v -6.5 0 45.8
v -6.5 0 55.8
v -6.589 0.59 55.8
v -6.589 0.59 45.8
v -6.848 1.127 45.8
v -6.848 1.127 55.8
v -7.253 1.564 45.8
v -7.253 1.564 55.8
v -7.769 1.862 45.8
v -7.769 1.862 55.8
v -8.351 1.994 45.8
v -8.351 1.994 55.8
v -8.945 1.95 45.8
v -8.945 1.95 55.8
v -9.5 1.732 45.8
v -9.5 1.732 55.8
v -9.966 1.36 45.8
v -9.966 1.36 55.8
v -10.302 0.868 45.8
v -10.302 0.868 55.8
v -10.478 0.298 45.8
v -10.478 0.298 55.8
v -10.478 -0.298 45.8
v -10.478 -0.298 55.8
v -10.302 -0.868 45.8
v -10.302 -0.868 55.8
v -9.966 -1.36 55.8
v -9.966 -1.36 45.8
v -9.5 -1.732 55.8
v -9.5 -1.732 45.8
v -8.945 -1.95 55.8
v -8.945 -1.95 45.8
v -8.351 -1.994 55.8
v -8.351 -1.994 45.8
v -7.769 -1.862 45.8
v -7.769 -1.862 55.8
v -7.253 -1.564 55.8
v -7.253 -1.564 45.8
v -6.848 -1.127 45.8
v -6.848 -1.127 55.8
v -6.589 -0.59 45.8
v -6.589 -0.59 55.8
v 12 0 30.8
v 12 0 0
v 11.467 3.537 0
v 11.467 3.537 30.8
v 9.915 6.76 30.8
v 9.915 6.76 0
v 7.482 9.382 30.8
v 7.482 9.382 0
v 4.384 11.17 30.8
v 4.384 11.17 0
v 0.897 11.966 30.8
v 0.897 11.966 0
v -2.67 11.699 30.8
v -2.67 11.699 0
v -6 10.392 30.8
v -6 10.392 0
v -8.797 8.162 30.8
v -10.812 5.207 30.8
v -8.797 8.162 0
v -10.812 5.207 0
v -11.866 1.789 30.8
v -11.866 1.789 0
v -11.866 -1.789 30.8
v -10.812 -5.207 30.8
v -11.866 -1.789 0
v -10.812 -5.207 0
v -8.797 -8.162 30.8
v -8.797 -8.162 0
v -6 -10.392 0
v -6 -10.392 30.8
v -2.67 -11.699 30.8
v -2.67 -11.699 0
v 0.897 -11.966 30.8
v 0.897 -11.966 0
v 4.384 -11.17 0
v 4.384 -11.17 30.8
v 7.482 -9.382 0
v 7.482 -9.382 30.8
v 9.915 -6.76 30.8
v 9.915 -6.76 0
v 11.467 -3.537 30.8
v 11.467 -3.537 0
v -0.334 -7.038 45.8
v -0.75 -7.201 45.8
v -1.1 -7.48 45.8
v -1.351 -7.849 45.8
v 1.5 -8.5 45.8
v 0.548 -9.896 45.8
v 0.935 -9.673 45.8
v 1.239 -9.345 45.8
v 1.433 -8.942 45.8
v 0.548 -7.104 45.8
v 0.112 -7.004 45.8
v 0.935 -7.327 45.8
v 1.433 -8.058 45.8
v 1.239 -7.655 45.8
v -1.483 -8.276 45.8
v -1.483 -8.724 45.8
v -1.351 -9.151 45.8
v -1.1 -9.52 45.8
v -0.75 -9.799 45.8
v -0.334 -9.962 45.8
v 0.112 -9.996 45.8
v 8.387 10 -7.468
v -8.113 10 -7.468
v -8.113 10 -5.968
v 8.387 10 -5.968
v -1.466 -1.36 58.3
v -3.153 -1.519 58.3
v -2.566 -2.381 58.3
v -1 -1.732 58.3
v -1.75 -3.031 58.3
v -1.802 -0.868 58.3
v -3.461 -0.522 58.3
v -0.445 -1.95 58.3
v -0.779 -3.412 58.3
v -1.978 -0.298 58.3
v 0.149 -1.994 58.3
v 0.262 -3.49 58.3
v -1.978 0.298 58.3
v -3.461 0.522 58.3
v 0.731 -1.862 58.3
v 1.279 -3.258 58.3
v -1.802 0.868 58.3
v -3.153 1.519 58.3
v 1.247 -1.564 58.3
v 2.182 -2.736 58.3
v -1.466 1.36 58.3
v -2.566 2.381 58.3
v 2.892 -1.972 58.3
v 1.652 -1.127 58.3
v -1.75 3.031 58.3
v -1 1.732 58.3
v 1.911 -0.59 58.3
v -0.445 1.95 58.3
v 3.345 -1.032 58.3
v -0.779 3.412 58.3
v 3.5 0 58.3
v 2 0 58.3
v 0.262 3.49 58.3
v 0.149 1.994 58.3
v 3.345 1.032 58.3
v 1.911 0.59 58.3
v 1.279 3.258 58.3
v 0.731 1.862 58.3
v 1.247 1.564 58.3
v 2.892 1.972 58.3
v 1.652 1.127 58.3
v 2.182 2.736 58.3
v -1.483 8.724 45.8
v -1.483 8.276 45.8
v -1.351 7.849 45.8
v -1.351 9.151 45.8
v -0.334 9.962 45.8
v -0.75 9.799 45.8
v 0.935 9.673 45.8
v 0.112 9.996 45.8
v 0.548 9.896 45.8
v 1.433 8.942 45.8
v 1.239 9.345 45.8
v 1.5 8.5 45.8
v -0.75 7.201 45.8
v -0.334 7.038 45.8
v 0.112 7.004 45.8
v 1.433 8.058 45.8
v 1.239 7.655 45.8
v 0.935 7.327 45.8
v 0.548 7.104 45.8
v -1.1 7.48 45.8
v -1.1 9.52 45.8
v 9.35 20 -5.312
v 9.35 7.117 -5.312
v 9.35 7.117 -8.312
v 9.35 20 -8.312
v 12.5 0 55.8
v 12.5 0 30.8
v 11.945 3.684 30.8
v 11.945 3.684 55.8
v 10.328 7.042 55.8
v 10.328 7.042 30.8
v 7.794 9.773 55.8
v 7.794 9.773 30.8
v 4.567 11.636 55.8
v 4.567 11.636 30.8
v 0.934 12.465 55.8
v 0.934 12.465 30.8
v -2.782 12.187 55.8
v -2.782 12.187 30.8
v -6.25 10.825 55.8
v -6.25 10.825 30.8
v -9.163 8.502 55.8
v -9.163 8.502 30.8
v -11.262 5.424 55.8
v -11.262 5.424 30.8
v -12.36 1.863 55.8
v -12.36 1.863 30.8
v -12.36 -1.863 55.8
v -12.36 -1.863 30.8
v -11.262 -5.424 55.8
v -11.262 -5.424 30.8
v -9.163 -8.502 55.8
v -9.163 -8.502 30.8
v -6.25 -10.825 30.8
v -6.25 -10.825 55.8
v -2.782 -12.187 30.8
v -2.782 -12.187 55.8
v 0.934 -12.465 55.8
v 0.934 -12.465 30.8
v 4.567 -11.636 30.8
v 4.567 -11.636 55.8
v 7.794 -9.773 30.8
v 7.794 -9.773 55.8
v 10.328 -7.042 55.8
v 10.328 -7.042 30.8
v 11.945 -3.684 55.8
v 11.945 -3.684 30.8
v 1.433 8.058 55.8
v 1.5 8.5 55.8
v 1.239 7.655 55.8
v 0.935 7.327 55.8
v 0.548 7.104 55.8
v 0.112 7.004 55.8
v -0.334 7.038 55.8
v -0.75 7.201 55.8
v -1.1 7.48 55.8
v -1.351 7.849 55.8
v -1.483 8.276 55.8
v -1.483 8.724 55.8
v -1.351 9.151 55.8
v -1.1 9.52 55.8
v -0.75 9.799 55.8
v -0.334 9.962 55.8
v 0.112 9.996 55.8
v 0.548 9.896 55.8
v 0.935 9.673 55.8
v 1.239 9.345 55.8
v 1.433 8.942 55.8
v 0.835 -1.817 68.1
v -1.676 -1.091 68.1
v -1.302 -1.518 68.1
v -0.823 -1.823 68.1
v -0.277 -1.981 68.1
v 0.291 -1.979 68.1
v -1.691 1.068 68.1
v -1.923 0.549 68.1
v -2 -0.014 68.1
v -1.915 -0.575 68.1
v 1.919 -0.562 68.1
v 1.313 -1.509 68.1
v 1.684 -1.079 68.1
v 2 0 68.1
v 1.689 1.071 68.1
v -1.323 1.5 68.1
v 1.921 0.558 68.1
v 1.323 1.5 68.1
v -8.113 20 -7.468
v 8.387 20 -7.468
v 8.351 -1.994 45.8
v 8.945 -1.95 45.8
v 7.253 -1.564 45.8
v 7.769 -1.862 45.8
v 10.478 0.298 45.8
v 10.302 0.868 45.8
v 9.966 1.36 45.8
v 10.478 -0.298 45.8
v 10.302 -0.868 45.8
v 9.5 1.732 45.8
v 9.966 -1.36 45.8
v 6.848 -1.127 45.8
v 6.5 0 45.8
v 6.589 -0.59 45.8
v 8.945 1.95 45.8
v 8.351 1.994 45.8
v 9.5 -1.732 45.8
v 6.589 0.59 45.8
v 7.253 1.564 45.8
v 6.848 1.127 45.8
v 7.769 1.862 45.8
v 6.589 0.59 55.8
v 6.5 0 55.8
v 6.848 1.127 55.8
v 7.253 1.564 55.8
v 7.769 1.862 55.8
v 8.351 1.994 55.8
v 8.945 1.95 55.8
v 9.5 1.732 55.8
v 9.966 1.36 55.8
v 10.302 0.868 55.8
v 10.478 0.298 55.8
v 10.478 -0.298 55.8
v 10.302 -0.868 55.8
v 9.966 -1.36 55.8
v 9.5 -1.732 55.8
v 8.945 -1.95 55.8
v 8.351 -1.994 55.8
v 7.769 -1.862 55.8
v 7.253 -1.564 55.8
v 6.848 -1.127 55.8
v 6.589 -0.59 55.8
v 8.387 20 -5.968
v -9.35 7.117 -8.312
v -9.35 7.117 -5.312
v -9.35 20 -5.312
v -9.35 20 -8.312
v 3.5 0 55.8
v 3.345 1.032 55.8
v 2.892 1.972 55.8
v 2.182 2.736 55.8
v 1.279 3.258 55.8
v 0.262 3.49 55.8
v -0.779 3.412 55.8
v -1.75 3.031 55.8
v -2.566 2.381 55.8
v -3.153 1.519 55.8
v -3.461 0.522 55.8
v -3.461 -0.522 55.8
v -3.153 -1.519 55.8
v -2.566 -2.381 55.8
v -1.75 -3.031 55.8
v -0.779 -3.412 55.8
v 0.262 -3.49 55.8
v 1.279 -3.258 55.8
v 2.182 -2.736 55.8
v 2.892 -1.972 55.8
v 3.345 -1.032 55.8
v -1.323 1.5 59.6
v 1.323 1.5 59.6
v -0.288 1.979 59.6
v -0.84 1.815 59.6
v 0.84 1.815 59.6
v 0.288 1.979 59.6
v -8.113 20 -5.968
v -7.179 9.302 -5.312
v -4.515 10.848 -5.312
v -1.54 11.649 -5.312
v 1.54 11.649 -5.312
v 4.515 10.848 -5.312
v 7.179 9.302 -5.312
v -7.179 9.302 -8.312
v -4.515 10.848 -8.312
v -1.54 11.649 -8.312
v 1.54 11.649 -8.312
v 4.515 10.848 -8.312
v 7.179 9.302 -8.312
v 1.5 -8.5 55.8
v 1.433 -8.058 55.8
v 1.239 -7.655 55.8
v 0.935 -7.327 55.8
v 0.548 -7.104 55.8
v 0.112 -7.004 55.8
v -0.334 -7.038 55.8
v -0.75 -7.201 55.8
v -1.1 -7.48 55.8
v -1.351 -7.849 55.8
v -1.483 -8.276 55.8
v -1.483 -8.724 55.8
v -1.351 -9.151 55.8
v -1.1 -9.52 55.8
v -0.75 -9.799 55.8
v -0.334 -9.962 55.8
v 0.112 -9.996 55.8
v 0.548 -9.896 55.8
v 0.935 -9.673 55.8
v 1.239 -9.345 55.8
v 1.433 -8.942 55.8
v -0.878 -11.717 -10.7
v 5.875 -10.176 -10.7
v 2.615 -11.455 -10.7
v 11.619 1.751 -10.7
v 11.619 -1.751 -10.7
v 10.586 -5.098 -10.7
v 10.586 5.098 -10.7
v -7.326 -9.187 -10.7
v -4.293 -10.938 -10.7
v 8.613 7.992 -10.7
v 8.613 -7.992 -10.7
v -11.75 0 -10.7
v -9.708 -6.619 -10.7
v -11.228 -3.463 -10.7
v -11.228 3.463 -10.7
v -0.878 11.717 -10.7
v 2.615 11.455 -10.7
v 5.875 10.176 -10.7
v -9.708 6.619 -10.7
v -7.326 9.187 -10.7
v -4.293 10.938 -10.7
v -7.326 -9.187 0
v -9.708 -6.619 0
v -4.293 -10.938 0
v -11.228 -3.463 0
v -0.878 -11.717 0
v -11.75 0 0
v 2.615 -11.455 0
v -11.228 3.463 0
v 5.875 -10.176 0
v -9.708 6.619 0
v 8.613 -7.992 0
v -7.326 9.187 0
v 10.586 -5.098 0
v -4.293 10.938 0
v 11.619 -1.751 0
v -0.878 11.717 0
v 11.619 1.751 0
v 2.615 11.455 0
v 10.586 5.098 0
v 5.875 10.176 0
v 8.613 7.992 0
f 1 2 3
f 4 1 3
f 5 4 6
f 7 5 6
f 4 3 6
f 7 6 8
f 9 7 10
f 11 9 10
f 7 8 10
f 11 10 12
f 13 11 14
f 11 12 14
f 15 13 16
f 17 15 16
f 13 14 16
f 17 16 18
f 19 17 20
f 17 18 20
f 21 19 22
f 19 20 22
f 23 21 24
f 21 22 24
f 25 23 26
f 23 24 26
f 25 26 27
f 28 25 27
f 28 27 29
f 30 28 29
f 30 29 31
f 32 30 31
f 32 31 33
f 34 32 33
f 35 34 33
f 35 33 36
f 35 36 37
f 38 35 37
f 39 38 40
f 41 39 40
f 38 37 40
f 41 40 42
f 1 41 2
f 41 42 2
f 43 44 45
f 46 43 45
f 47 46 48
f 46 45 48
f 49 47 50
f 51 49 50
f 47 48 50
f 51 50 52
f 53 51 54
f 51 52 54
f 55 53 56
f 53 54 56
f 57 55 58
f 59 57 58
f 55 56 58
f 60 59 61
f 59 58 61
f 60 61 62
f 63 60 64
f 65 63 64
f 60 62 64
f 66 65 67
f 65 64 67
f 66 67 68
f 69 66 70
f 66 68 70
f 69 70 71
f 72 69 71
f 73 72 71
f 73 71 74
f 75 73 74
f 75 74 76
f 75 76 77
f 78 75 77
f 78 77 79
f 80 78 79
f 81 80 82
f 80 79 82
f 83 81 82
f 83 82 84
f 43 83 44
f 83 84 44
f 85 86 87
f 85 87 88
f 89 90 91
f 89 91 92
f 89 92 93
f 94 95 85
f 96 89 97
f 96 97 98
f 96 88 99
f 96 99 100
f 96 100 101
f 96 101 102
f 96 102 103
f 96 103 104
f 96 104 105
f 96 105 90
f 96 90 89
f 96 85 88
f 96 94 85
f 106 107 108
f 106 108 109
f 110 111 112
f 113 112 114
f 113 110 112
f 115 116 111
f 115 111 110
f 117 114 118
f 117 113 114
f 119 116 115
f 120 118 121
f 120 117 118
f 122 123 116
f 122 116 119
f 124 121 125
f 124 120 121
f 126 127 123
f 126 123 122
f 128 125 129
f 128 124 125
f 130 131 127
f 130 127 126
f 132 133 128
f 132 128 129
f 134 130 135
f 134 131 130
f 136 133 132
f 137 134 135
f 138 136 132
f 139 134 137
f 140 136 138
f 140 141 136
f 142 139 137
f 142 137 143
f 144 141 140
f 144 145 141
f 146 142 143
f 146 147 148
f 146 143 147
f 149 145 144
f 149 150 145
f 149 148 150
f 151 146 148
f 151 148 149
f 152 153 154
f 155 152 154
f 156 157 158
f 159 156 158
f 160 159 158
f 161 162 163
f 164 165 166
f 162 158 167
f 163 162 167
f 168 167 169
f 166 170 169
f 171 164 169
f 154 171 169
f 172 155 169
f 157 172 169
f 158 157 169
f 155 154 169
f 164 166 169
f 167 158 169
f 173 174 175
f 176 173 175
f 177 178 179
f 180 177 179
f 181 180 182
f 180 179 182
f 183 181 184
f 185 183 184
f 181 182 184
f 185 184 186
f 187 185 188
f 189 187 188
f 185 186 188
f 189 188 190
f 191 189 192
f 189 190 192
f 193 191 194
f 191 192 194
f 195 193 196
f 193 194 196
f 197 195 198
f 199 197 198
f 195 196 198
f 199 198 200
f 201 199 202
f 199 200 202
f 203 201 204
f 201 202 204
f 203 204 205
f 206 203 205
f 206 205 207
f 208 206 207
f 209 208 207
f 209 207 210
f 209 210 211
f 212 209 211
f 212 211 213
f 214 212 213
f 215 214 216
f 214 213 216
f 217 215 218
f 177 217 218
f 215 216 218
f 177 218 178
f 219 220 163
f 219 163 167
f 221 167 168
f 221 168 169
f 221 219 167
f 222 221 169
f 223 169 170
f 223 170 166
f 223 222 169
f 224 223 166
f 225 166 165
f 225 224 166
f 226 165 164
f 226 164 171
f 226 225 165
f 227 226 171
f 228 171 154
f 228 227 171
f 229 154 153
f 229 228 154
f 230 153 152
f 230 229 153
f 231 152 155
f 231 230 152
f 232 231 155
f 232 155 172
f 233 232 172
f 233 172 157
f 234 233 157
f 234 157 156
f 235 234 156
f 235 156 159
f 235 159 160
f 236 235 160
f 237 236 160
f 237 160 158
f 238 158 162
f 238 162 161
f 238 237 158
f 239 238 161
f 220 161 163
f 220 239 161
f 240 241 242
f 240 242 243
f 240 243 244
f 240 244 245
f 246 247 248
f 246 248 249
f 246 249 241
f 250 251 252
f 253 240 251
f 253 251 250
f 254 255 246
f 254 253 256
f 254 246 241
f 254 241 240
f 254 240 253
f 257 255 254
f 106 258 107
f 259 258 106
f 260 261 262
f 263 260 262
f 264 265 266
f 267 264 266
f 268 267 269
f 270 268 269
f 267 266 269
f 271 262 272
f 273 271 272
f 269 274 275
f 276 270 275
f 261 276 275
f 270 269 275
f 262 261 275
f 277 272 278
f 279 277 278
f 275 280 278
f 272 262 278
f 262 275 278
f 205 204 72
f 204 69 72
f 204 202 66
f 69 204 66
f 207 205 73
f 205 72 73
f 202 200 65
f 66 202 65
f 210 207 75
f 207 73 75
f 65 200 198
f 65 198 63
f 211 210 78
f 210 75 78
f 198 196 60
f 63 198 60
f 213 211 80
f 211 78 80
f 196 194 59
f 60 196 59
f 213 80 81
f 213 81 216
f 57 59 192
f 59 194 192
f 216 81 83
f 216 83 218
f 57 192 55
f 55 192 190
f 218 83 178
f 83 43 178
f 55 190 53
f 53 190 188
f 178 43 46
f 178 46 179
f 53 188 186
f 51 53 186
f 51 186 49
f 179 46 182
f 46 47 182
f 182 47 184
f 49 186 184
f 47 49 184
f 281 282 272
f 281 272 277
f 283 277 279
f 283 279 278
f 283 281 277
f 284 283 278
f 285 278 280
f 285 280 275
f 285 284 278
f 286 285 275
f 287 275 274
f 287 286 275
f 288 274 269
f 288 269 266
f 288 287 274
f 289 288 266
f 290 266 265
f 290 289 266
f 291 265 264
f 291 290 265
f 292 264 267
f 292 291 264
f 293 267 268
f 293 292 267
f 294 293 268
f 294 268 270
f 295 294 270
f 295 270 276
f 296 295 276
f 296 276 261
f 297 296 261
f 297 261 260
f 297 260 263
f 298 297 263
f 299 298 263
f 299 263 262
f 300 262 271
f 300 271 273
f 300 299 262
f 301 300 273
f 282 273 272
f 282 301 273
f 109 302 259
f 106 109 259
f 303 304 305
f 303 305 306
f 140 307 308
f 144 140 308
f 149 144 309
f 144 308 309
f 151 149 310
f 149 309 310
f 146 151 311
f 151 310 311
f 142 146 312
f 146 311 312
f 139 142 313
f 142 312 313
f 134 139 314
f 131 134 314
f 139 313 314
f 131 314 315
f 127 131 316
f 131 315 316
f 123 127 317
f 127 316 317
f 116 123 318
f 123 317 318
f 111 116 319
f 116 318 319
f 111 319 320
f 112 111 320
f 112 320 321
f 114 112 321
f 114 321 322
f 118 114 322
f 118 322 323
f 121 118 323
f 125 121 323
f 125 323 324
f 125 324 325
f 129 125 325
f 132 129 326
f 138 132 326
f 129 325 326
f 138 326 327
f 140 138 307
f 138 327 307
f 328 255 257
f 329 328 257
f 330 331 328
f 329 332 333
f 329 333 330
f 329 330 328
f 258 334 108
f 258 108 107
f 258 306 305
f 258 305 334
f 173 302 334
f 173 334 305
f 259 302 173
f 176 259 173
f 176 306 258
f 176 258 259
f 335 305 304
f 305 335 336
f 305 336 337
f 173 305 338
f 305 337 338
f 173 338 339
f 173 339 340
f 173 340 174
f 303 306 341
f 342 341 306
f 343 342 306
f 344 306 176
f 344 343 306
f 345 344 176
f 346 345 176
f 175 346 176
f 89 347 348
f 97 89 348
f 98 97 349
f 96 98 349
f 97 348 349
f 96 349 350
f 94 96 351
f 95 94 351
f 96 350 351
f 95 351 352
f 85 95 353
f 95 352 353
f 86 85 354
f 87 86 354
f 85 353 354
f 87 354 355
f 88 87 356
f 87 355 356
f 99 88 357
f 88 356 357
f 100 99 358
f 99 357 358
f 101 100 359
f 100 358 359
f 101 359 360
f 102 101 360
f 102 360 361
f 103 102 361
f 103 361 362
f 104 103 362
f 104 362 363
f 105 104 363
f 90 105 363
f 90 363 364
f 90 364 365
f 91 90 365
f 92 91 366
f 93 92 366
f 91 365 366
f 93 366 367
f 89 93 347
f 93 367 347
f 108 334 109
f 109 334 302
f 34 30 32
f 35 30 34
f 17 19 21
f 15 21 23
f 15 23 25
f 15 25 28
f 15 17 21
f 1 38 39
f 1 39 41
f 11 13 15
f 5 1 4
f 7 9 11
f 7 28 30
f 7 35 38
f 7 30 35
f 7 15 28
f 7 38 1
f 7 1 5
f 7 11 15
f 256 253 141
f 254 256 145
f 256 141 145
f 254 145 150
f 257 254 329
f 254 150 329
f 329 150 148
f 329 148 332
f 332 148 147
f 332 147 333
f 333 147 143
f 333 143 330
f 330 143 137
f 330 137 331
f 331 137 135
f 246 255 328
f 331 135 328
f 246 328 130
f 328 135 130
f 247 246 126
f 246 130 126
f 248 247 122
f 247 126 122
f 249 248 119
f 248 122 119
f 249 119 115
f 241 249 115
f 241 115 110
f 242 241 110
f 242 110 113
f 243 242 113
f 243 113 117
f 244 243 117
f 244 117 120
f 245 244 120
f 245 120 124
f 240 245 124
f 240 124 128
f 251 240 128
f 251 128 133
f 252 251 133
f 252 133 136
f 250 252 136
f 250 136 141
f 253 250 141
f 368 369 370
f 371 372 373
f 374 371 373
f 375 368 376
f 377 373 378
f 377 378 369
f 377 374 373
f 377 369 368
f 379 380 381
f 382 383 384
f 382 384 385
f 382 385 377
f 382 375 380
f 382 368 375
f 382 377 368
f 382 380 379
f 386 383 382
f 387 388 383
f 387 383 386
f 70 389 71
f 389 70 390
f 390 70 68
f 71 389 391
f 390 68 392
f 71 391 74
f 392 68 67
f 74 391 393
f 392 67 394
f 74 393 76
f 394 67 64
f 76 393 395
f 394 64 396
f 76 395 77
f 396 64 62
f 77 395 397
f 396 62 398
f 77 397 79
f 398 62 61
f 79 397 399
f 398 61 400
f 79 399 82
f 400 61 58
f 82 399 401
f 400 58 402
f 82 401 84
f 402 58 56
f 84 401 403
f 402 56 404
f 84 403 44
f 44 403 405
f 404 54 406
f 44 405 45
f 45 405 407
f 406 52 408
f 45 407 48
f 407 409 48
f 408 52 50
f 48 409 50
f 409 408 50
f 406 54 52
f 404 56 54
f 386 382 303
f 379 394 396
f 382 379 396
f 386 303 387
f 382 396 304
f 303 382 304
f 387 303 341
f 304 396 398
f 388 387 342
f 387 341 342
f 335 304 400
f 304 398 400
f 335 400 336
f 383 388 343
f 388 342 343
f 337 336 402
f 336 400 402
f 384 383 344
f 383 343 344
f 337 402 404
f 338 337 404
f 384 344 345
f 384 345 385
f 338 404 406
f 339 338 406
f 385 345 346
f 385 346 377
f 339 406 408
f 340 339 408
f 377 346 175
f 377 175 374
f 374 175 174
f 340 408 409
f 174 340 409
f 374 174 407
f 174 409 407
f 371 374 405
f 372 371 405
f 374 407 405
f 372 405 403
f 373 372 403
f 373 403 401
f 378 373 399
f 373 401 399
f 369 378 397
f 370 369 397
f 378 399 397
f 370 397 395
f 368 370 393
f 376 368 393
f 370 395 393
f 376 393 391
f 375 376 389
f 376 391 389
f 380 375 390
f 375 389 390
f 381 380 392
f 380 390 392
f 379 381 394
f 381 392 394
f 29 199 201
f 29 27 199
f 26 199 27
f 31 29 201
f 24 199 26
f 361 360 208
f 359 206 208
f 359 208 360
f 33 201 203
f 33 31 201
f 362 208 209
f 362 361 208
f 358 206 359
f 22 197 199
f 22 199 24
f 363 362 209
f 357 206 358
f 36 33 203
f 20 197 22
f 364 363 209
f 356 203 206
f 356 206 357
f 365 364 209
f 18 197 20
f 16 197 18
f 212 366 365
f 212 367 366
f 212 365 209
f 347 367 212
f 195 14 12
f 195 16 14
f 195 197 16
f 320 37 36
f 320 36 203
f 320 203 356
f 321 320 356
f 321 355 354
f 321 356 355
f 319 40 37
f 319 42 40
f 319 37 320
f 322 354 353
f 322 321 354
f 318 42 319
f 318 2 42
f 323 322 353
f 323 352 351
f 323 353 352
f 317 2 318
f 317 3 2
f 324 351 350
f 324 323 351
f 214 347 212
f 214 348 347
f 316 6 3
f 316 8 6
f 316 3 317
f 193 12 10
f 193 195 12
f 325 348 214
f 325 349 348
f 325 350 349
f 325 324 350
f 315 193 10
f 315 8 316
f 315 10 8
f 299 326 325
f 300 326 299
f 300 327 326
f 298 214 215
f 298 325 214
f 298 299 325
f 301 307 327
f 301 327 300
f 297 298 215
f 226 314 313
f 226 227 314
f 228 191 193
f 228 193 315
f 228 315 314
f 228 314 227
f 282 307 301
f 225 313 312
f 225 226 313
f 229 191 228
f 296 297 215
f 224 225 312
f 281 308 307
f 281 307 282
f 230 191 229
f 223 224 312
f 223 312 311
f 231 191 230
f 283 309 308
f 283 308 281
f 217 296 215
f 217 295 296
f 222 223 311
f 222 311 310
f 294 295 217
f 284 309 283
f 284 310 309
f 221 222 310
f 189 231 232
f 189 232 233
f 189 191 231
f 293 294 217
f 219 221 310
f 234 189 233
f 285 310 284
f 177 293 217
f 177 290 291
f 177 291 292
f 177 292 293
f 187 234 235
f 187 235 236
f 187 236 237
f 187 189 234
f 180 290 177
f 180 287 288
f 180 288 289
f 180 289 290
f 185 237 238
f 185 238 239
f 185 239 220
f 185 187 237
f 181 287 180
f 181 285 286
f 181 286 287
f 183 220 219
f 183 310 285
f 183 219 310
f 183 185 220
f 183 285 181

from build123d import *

# Parameters (mm, degrees)
SKETCH1_R           = 12
BOSS_EXTRUDE1_DEPTH = 30.8
SKETCH2_R           = 12.5
BOSS_EXTRUDE2_DEPTH = 25
SKETCH3_R           = 3.5
BOSS_EXTRUDE3_DEPTH = 2.5
SKETCH4_R           = 2
BOSS_EXTRUDE4_DEPTH = 9.8
CUT_EXTRUDE1_DEPTH  = 8.5
SKETCH6_R           = 11.75
BOSS_EXTRUDE5_DEPTH = 10.7
SKETCH7_W           = 18.699432978
SKETCH7_H           = 3
BOSS_EXTRUDE6_DEPTH = 20
SKETCH8_R           = 1.5
CUT_EXTRUDE2_DEPTH  = 10
SKETCH9_R           = 2
CUT_EXTRUDE3_DEPTH  = 10
SKETCH10_W          = 16.5
SKETCH10_H          = 1.5
CUT_EXTRUDE4_DEPTH  = 10


with BuildPart() as part:
    # Sketch1 → Boss-Extrude1 (new body)
    with BuildSketch(Plane.XY):
        Circle(SKETCH1_R)
    extrude(amount=BOSS_EXTRUDE1_DEPTH)

    # Sketch2 → Boss-Extrude2 (add)
    with BuildSketch(Plane.XY.offset(30.8)):
        Circle(SKETCH2_R)
    extrude(amount=BOSS_EXTRUDE2_DEPTH)

    # Sketch3 → Boss-Extrude3 (add)
    with BuildSketch(Plane.XY.offset(55.8)):
        Circle(SKETCH3_R)
    extrude(amount=BOSS_EXTRUDE3_DEPTH)

    # Sketch4 → Boss-Extrude4 (add)
    with BuildSketch(Plane.XY.offset(58.3)):
        Circle(SKETCH4_R)
    extrude(amount=BOSS_EXTRUDE4_DEPTH)

    # Sketch5 → Cut-Extrude1 (cut)
    with BuildSketch(Plane.XY.offset(68.1)):
        with BuildLine():
            Line((-1.322875656, 1.5), (0, 1.5))
            Line((0, 1.5), (1.322875656, 1.5))
            ThreePointArc((1.322875656, 1.5), (0, 2), (-1.322875656, 1.5))
        make_face()
    extrude(amount=-CUT_EXTRUDE1_DEPTH, mode=Mode.SUBTRACT)

    # Sketch6 → Boss-Extrude5 (add)
    with BuildSketch(Plane(origin=(0, 0, 0), x_dir=(-1, 0, 0), z_dir=(0, 0, -1))):
        Circle(SKETCH6_R)
    extrude(amount=BOSS_EXTRUDE5_DEPTH)

    # Sketch7 → Boss-Extrude6 (add)
    with BuildSketch(Plane(origin=(0, 0, 0), x_dir=(1, 0, 0), z_dir=(0, 1, 0))):
        with Locations((0, 6.81237414)):
            Rectangle(SKETCH7_W, SKETCH7_H)
    extrude(amount=BOSS_EXTRUDE6_DEPTH)

    # Sketch8 → Cut-Extrude2 (cut)
    with BuildSketch(Plane.XY.offset(55.8)):
        with Locations((0, -8.5)):
            Circle(SKETCH8_R)
    cut_extrude2 = extrude(amount=-CUT_EXTRUDE2_DEPTH, mode=Mode.SUBTRACT)

    # Mirror1: Cut-Extrude2 across plane
    add(cut_extrude2.mirror(Plane.ZX), mode=Mode.SUBTRACT)

    # Sketch9 → Cut-Extrude3 (cut)
    with BuildSketch(Plane.XY.offset(55.8)):
        with Locations((-8.5, 0)):
            Circle(SKETCH9_R)
    cut_extrude3 = extrude(amount=-CUT_EXTRUDE3_DEPTH, mode=Mode.SUBTRACT)

    # Mirror3: Cut-Extrude3 across plane
    add(cut_extrude3.mirror(Plane(origin=(0, 0, 0), x_dir=(0, 0, 1), z_dir=(1, 0, 0))), mode=Mode.SUBTRACT)

    # Sketch10 → Cut-Extrude4 (cut)
    with BuildSketch(Plane(origin=(0, 20, 0), x_dir=(1, 0, 0), z_dir=(0, 1, 0))):
        with Locations((0.137296408, 6.718389465)):
            Rectangle(SKETCH10_W, SKETCH10_H)
    extrude(amount=-CUT_EXTRUDE4_DEPTH, mode=Mode.SUBTRACT)


solid = part.part
